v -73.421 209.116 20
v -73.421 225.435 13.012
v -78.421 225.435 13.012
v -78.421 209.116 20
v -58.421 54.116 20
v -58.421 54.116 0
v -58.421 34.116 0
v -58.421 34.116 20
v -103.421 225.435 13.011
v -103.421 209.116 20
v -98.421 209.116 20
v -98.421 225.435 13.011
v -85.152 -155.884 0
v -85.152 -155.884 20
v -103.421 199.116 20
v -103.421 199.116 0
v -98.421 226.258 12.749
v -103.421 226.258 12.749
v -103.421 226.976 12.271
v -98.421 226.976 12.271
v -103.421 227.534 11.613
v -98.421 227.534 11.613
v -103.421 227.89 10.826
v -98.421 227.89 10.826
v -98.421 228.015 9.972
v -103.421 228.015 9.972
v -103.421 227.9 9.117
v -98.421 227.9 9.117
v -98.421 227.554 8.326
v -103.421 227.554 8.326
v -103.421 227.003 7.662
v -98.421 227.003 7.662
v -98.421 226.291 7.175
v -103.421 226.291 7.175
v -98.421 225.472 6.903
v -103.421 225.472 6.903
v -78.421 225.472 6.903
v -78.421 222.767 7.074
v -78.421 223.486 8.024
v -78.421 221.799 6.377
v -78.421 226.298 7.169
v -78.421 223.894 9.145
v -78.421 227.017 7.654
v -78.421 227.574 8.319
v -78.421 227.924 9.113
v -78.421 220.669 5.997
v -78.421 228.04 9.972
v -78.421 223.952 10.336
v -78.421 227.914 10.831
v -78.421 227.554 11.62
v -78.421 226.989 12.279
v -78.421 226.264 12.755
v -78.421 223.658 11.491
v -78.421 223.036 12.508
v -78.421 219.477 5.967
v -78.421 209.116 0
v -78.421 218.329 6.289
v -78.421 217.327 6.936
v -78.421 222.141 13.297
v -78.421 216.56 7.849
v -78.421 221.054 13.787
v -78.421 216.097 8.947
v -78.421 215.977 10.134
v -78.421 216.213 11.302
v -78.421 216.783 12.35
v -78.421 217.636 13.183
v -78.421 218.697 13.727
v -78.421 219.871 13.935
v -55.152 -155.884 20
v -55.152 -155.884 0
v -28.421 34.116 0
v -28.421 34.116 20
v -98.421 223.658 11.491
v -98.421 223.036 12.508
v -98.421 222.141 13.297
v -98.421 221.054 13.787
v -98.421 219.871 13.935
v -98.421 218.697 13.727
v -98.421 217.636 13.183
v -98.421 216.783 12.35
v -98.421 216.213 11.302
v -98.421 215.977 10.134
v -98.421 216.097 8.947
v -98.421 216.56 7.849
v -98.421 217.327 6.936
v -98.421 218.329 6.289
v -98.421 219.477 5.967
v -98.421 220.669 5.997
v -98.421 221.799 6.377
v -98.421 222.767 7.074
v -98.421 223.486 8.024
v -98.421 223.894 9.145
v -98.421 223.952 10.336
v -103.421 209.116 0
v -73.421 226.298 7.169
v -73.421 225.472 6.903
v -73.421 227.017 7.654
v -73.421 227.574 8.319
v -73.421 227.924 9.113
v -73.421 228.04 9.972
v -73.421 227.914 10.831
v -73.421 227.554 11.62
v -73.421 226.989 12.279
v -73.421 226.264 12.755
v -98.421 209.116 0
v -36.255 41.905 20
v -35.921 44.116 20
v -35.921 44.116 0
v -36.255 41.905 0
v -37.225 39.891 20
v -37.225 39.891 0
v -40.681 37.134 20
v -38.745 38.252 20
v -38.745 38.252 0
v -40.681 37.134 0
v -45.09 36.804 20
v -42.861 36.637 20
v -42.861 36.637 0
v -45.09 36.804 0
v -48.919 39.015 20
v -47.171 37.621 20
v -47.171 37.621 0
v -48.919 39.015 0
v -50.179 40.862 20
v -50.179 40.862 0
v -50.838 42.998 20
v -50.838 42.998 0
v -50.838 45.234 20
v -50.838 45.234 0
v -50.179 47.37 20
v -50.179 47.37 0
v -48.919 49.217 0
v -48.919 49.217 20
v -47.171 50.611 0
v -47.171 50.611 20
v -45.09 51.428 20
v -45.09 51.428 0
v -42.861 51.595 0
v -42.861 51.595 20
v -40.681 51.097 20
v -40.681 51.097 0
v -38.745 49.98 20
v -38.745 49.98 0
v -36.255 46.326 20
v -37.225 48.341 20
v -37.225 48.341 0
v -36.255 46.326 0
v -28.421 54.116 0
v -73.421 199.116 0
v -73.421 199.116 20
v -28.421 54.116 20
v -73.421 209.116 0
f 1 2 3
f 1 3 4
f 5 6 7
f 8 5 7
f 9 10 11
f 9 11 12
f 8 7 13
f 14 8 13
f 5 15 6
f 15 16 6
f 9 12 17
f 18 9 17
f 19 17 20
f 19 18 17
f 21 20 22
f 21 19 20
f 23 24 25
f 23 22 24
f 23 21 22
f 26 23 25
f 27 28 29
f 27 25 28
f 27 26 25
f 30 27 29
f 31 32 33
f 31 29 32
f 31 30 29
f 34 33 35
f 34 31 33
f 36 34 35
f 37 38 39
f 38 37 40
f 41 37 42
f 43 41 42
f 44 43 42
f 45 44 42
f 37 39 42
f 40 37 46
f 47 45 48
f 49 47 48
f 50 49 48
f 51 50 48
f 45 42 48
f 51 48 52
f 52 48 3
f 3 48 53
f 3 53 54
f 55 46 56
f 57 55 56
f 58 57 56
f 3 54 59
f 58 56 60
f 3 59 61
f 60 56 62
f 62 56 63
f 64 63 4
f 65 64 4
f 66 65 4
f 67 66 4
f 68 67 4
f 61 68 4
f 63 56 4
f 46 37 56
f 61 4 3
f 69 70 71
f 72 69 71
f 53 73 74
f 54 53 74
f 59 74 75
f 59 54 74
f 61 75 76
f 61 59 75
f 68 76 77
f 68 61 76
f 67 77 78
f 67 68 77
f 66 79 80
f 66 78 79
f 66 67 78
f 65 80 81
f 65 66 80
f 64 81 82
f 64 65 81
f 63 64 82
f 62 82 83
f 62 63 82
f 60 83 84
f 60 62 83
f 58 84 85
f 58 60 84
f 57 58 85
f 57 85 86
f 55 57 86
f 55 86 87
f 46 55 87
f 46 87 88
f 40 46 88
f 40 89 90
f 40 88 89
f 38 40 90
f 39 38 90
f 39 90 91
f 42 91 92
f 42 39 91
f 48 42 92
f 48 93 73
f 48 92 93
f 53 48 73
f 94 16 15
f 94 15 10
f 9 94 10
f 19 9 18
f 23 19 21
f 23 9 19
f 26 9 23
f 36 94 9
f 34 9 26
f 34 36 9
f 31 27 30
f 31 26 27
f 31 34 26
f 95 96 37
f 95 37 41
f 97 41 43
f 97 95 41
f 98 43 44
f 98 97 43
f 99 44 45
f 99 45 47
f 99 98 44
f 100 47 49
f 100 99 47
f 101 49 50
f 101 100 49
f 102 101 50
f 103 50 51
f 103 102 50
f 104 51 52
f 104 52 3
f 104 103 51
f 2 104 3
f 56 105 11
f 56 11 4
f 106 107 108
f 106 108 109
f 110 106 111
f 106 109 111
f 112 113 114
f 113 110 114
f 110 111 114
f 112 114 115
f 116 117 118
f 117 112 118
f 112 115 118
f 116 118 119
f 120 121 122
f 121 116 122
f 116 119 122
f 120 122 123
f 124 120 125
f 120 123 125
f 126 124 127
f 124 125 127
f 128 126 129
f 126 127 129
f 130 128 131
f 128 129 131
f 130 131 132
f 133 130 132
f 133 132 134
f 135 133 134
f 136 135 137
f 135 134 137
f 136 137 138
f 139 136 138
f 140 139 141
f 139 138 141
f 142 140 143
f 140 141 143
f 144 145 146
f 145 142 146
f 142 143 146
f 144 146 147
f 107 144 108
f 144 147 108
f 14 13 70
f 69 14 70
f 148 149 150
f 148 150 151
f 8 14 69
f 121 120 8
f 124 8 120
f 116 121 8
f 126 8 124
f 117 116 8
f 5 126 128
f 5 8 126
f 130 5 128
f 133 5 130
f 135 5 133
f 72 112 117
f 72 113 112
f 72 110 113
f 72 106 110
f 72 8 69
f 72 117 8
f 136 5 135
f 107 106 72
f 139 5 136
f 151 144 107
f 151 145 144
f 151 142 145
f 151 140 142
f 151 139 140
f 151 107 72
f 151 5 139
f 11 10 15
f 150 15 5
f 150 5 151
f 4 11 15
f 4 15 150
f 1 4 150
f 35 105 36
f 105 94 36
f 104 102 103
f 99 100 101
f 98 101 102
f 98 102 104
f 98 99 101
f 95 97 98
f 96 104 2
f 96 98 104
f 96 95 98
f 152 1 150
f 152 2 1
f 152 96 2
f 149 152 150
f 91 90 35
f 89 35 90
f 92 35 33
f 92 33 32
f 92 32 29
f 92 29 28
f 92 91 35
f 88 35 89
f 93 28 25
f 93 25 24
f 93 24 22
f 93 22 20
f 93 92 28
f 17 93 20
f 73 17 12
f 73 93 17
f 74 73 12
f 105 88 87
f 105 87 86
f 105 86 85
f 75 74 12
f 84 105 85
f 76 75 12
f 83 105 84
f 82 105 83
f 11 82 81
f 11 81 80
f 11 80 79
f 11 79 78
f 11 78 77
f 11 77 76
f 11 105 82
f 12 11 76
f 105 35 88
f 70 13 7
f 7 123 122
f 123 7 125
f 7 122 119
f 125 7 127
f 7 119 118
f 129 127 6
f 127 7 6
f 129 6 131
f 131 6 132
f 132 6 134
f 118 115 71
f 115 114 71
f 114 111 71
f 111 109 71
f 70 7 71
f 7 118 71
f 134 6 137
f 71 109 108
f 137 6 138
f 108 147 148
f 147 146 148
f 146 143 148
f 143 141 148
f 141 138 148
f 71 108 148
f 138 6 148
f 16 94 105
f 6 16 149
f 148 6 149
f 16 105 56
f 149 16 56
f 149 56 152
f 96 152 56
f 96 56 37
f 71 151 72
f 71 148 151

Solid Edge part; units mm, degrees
sketch "Sketch1" plane through (0, 0, 0) normal (0, 0, 1) x (1, 0, 0)
  circle A0 centre (-43.4214, 44.1158) radius 7.5
  line L0 (-103.4214, 199.1158) -> (-58.4214, 54.1158)
  line L1 (-58.4214, 54.1158) -> (-58.4214, 34.1158)
  line L2 (-58.4214, 34.1158) -> (-85.1518, -155.8842)
  line L3 (-85.1518, -155.8842) -> (-55.1518, -155.8842)
  line L4 (-55.1518, -155.8842) -> (-28.4214, 34.1158)
  line L5 (-28.4214, 54.1158) -> (-28.4214, 34.1158)
  line L6 (-73.4214, 199.1158) -> (-28.4214, 54.1158)
  line L7 (-73.4214, 209.1158) -> (-73.4214, 199.1158)
  line L8 (-103.4214, 209.1158) -> (-73.4214, 209.1158)
  line L9 (-103.4214, 199.1158) -> (-103.4214, 209.1158)
  dimension "D1" = 20
  dimension "D2" = 10
  dimension "D3" = 30
  dimension "D4" = 10
  dimension "D5" = 20
  dimension "D6" = 15
  dimension "D7" = 160
  dimension "D8" = 200
  dimension "D9" = 30
extrude "Protrusion1" add sketch "Sketch1" along normal blind 20
sketch "Sketch2" plane through (-73.4214, 6.6158, 20) normal (1, 0, 0) x (0, 0, 1)
  line L0 (-20, -202.5) -> (-13.0975, -218.8561)
  arc A0 (-13.0975, -218.8561) -> (-6.9885, -218.8196) centre (-10.046, -218.3277) ccw
  line L1 (-6.9885, -218.8196) -> (0, -202.5)
  line L2 (-20, -202.5) -> (0, -202.5)
extrude "ExtrudedProtrusion_3" add sketch "Sketch2" against normal blind 5
sketch "Sketch3" plane through (-103.4214, 204.1158, 10) normal (-1, 0, 0) x (0, 1, 0)
  line L0 (5, 10) -> (21.3561, 3.0975)
  arc A0 (21.3561, 3.0975) -> (21.3196, -3.0115) centre (20.7972, 0.0462) cw
  line L1 (5, -10) -> (21.3196, -3.0115)
  line L2 (5, 10) -> (5, -10)
extrude "ExtrudedProtrusion_7" add sketch "Sketch3" against normal blind 5
sketch "Sketch4" plane through (-78.4214, 219.9429, 5) normal (-1, 0, 0) x (0, 0.9213, 0.3888)
  circle A0 centre (1.9464, -4.536) radius 4
  dimension "D1" = 8
extrude "Protrusion2" add sketch "Sketch4" along normal up to vertex (20 mm away)
